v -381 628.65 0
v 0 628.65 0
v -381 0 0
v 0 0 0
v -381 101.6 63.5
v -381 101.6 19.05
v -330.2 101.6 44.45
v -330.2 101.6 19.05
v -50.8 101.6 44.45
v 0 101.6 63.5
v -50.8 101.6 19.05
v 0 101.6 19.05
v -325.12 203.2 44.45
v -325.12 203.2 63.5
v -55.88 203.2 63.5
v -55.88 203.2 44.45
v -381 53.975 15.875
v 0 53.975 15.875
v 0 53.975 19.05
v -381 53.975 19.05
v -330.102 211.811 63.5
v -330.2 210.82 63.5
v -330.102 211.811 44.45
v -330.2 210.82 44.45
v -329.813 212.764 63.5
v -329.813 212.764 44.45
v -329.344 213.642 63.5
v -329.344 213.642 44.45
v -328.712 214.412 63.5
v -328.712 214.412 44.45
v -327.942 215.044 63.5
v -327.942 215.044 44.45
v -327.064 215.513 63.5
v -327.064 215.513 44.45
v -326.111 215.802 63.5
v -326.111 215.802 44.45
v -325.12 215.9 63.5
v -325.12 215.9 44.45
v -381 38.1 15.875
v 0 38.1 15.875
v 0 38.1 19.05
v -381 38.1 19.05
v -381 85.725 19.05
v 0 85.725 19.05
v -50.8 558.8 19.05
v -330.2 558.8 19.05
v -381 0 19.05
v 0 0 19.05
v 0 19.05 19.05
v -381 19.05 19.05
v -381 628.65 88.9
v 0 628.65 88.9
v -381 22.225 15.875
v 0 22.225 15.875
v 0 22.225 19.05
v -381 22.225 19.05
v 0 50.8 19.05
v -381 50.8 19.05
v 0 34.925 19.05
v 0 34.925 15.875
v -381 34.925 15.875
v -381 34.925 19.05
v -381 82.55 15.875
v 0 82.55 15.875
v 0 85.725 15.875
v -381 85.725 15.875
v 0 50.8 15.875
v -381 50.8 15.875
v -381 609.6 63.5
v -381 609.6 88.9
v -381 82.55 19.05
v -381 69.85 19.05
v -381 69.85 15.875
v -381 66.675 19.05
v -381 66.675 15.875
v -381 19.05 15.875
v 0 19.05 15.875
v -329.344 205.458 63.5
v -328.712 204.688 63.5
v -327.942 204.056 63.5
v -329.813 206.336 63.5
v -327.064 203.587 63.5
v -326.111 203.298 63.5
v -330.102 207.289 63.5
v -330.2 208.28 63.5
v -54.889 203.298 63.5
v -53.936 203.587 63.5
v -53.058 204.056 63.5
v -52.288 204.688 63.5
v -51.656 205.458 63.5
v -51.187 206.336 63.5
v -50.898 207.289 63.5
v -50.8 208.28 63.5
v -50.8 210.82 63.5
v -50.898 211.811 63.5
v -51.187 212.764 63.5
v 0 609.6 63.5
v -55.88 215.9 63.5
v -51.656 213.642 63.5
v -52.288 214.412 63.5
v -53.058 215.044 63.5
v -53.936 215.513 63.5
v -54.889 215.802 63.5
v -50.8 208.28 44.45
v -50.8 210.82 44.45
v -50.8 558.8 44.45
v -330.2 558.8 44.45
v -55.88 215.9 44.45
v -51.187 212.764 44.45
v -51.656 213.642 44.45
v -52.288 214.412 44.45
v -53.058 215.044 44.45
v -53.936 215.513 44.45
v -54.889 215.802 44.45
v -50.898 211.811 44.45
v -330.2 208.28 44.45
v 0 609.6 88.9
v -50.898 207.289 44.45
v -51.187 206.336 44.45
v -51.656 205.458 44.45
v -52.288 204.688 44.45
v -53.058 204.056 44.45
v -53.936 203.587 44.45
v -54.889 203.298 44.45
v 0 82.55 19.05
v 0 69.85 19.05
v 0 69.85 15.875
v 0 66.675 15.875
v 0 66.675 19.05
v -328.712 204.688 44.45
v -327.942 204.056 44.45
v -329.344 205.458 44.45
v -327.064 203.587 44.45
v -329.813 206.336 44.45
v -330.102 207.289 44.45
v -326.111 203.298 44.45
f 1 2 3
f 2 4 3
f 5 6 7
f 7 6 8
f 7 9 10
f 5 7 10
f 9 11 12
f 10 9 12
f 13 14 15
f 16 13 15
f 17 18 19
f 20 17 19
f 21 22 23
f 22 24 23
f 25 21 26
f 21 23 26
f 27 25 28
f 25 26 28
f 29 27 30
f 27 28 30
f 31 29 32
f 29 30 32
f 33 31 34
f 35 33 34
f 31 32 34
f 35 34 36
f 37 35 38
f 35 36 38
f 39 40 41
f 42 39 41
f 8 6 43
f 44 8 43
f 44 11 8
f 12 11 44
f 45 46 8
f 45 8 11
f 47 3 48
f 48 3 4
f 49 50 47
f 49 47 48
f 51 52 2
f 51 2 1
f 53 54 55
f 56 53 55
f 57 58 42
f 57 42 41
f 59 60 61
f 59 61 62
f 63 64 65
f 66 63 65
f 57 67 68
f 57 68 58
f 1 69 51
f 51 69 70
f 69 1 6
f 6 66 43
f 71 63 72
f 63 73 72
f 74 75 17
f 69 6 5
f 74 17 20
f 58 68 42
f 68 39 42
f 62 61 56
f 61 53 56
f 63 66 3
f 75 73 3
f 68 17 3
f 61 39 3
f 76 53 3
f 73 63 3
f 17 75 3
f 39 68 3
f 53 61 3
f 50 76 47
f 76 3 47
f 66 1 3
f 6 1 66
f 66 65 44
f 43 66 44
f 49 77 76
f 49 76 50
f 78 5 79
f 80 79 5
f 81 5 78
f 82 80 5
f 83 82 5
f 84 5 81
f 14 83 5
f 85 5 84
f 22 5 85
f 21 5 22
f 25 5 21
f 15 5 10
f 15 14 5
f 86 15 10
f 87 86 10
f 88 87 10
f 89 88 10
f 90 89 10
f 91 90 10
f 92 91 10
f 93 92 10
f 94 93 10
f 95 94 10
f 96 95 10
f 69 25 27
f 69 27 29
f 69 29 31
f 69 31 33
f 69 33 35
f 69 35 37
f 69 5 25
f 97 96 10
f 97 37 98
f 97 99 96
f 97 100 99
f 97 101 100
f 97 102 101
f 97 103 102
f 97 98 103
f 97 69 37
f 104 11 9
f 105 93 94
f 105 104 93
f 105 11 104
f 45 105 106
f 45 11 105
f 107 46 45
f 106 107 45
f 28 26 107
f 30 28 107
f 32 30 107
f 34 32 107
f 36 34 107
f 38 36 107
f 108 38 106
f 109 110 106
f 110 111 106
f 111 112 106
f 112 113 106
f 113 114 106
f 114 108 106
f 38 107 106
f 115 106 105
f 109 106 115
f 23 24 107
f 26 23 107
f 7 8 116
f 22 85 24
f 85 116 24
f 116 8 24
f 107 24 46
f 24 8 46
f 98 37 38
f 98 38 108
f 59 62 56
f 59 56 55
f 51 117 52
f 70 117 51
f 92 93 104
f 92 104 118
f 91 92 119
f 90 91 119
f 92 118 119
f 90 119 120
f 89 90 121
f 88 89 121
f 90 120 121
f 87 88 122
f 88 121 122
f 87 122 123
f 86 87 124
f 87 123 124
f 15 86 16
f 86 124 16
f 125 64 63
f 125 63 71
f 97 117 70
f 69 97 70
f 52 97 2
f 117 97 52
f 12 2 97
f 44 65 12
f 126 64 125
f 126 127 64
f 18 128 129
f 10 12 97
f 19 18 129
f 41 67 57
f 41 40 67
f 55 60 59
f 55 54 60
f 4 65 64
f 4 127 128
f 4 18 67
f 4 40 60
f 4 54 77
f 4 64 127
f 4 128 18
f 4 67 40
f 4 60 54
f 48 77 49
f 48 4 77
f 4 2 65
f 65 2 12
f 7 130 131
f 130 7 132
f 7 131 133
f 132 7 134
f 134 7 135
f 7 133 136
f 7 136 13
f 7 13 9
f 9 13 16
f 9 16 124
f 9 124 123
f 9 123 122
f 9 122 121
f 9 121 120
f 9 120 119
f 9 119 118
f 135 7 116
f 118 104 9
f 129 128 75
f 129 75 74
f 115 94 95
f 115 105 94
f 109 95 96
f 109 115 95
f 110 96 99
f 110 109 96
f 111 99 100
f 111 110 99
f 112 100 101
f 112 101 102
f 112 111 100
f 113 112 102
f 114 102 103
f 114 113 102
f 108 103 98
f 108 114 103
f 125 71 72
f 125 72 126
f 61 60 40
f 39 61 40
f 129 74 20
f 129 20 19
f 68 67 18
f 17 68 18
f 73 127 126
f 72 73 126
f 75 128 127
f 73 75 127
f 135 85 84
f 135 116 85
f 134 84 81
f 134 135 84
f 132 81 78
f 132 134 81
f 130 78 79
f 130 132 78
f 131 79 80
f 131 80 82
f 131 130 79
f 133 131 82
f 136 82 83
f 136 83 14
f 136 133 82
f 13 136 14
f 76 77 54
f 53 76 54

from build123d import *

# Parameters (mm, degrees)
F0_W      = 381
F0_H      = 609.6
F1_DEPTH  = 19.05
F2_W      = 50.8
F2_H      = 457.2
F3_DEPTH  = 25.4
F4_W      = 381
F4_H      = 508
F5_DEPTH  = 19.05
F6_W      = 381
F6_H      = 88.9
F7_DEPTH  = 19.05
F8_W      = 3.175
F8_H      = 3.175
F9_DEPTH  = 381
F10_W     = 279.4
F10_H     = 12.7
F11_DEPTH = 19.05
F12_R     = 5.08


with BuildPart() as f1:
    # F0 (on Top) → F1 (new body)
    with BuildSketch(Plane.XY):
        with Locations((-190.5, 304.8)):
            Rectangle(F0_W, F0_H)
    extrude(amount=F1_DEPTH)

    # F2 (on face) → F3 (join)
    with BuildSketch(Plane.XY.offset(19.05)):
        with Locations((-25.4, 330.2)):
            Rectangle(F2_W, F2_H)
        Polygon((0, 609.6), (-381, 609.6), (-381, 558.8), (-330.2, 558.8), (-50.8, 558.8), (0, 558.8), align=None)
        with Locations((-355.6, 330.2)):
            Rectangle(F2_W, F2_H)
    extrude(amount=F3_DEPTH)

    # F4 (on face) → F5 (join)
    with BuildSketch(Plane.XY.offset(44.45)):
        with Locations((-190.5, 355.6)):
            Rectangle(F4_W, F4_H)
    extrude(amount=F5_DEPTH)

    # F6 (on face) → F7 (join)
    with BuildSketch(Plane(origin=(0, 609.6, 0), x_dir=(-1, 0, 0), z_dir=(0, 1, 0))):
        with Locations((190.5, 44.45)):
            Rectangle(F6_W, F6_H)
    extrude(amount=F7_DEPTH)

    # F8 (on face) → F9 (cut)
    with BuildSketch(Plane.YZ):
        with Locations((20.6375, 17.4625)):
            Rectangle(F8_W, F8_H)
        with Locations((36.5125, 17.4625)):
            Rectangle(F8_W, F8_H)
        with Locations((52.3875, 17.4625)):
            Rectangle(F8_W, F8_H)
        with Locations((68.2625, 17.4625)):
            Rectangle(F8_W, F8_H)
        with Locations((84.1375, 17.4625)):
            Rectangle(F8_W, F8_H)
    extrude(amount=-F9_DEPTH, mode=Mode.SUBTRACT)

    # F10 (on face) → F11 (cut)
    with BuildSketch(Plane.XY.offset(63.5)):
        with Locations((-190.5, 209.55)):
            Rectangle(F10_W, F10_H)
    extrude(amount=-F11_DEPTH, mode=Mode.SUBTRACT)

    # F12
    f12_edges = [f1.edges().sort_by_distance(p)[0] for p in [
        (-330.2, 215.9, 53.975),
        (-330.2, 203.2, 53.975),
        (-50.8, 215.9, 53.975),
        (-50.8, 203.2, 53.975),
    ]]
    fillet(f12_edges, radius=F12_R)


solid = f1.part
